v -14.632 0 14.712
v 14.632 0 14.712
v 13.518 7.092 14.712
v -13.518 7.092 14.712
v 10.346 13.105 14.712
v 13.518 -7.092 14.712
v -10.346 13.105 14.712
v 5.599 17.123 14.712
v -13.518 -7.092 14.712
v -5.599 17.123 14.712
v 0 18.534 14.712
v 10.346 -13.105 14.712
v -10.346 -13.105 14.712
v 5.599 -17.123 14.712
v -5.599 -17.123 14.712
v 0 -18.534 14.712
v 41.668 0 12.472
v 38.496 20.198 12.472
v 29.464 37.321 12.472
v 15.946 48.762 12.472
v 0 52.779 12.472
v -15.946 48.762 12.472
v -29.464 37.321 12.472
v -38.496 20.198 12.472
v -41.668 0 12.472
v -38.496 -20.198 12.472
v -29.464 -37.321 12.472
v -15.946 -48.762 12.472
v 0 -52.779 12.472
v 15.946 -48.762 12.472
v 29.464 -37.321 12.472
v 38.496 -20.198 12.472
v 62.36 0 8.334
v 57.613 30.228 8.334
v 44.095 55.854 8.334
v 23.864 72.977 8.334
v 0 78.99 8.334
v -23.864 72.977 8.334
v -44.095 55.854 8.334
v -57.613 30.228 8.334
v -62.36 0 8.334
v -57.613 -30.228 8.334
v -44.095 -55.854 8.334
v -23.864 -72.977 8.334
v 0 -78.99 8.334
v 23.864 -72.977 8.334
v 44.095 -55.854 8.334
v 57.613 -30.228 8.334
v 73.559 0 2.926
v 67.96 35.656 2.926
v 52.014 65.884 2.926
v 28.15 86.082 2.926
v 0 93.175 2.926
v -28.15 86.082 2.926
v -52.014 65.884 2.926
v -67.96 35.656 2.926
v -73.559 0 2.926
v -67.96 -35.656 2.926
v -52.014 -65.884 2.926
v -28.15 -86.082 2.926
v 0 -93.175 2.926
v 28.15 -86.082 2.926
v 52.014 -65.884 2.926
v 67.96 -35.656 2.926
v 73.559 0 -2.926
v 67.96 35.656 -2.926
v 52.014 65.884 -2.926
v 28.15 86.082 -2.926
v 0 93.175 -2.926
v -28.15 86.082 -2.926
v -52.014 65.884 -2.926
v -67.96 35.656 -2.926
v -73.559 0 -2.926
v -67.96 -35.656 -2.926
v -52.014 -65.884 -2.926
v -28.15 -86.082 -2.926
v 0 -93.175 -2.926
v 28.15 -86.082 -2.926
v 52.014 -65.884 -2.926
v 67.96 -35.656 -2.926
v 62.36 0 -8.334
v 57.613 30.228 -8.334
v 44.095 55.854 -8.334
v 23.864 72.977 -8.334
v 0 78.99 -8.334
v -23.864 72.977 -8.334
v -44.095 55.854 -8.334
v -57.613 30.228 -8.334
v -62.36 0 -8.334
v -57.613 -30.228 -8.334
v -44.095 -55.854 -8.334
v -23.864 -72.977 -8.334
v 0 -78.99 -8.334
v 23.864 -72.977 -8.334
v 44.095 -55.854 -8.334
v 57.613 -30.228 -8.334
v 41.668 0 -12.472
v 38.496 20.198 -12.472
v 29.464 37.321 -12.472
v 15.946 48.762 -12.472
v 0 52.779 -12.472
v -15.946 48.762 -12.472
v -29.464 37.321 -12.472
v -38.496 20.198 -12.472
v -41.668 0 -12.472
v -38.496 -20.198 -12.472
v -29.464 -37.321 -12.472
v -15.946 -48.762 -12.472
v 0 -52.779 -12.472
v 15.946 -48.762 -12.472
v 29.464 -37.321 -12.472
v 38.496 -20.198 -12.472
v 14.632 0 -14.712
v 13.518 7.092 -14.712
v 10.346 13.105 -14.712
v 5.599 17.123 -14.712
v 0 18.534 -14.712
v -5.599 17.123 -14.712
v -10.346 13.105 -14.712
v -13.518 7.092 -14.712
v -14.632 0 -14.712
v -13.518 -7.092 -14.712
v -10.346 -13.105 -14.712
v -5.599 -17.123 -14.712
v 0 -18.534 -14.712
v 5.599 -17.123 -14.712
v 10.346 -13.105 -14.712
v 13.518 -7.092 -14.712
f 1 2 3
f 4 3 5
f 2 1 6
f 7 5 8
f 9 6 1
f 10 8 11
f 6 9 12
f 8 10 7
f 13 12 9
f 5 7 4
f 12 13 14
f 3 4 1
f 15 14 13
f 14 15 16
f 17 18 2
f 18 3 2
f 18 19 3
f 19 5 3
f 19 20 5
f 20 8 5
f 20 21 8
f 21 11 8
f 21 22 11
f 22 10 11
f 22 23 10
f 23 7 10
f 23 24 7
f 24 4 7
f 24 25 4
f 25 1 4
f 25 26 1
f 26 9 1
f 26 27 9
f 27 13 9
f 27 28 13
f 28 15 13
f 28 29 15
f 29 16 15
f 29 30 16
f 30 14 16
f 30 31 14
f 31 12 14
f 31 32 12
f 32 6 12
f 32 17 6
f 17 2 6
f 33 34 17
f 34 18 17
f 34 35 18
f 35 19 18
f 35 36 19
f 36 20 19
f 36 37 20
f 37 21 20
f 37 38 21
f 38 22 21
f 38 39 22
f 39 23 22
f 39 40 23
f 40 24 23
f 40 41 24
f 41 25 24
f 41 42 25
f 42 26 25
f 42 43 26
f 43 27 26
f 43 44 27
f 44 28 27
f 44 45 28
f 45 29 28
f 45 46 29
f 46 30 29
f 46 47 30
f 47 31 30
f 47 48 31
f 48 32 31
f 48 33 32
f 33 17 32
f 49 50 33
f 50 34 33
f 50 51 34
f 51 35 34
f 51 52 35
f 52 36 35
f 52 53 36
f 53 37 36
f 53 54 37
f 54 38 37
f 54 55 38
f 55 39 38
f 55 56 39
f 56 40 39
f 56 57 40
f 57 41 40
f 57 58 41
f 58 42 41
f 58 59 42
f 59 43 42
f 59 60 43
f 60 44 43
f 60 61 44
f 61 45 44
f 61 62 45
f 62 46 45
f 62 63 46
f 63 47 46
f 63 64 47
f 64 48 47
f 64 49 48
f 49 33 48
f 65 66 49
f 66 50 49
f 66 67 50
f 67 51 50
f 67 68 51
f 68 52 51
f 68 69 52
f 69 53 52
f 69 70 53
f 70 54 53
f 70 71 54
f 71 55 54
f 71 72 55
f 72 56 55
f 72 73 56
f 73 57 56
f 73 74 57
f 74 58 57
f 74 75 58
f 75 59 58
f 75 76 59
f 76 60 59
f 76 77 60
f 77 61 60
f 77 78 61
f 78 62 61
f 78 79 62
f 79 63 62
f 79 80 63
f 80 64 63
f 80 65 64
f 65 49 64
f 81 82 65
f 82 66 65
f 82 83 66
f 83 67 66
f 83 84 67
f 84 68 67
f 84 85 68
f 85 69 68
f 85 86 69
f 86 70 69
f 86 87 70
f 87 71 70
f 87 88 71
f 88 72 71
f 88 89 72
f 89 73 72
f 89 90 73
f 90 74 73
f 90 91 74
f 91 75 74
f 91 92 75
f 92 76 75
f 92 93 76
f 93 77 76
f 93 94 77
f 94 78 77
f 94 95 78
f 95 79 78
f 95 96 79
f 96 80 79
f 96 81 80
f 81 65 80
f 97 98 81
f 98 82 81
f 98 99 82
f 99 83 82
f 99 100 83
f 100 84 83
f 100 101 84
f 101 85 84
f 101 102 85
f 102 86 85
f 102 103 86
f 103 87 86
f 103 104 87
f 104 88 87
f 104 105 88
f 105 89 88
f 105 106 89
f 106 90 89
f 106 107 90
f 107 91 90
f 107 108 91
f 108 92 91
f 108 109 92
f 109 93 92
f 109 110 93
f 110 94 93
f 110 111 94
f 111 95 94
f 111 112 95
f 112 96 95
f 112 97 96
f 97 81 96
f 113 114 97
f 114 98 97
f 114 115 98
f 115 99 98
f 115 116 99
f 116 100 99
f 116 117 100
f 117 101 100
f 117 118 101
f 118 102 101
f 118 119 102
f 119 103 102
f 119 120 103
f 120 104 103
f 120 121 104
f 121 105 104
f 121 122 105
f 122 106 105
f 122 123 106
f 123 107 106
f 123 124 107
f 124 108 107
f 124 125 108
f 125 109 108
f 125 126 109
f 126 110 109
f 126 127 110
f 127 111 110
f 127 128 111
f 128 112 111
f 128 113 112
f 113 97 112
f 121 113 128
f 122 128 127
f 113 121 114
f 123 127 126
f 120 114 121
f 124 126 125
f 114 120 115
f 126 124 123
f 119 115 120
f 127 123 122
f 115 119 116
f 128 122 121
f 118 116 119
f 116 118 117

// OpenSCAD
// Generated by SolidPython 1.0.1 on 2020-07-29 00:46:52


scale(v = [15, 19, 3]) {
	sphere(r = 5);
}
/***********************************************
*********      SolidPython code:      **********
************************************************
 
# import packages: SolidPython
from solid import *
from solid.utils import *
from itertools import chain, combinations, permutations


class Resize:

    def __init__(self, scad_file):
        self.scad_file = scad_file
        #self.scad_file = import_scad(scad_file)
        # cone/cylinder param:
        self.r1 = 0
        self.r2 = 0
        self.h = 0
        # rectangular prism param:
        self.w = 0
        self.l = 0
        # ellipse param:
        self.r = 0

    # import OpenScad code (file name corresponds to shape)


    # classify shape + parameters
    def assign(self, param1, param2, param3):
        if self.scad_file == 'cone.scad':
            self.r1 = param1
            self.r2 = param2
            self.h = param3
        elif self.scad_file == 'cylinder.scad':
            self.r1 = param1
            self.r2 = param2
            self.h = param3
        elif self.scad_file == 'rectangularPrism.scad':
            self.h = param1
            self.l = param2
            self.w = param3
        else:
            self.r = param1
            self.h = param2

    # resize parameters
    def iterate(self):
        x = range(3, 20, 2)
        i = 1
        if self.scad_file == 'cone.scad':
            tempList = list(permutations(x, 2))
            for temp in tempList:
                param1 = temp[0]
                param2 = temp[1]
                filepath = 'produced_scad_files/' + 'cone' + str(param1) + '_' + str(param2) + '_' + '.scad'
                scad_render_to_file(cylinder(h=param1, r1=param2, r2=0), filepath)

        elif self.scad_file == 'cylinder.scad':
            tempList = list(permutations(x, 3))
            for temp in tempList:
                param1 = temp[0]
                param2 = temp[1]
                filepath = 'produced_scad_files/' + 'cylinder' + str(param1) + '_' + str(param2) + '_' + '.scad'
                scad_render_to_file(cylinder(h=param1, r1=param2, r2=param2), filepath)

        elif self.scad_file == 'rectangularPrism.scad':
            tempList = list(permutations(x, 3))
            for temp in tempList:
                param1 = temp[0]
                param2 = temp[1]
                param3 = temp[2]
                filepath = 'produced_scad_files/' + 'rectangularPrism' + str(param1) + '_' + str(param2) + '_' + str(
                    param3) + '.scad'
                scad_render_to_file(cube(size=(param1, param2, param3)), filepath)

        elif self.scad_file == 'ellipse.scad':
            tempList = list(permutations(x, 4))
            for temp in tempList:
                param1 = temp[0]
                param2 = temp[1]
                param3 = temp[2]
                param4 = temp[3]
                filepath = 'produced_scad_files/' + 'ellipse' + str(param1) + '_' + str(param2) + '_' + str(param3) + '_' + str(param4) + '.scad'
                scad_render_to_file(scale([param1, param2, param3])(sphere(r=param4)), filepath)

    def render_to_scadfile(self):
        scad_render_to_file(scad, 'example.scad') 
 
************************************************/
